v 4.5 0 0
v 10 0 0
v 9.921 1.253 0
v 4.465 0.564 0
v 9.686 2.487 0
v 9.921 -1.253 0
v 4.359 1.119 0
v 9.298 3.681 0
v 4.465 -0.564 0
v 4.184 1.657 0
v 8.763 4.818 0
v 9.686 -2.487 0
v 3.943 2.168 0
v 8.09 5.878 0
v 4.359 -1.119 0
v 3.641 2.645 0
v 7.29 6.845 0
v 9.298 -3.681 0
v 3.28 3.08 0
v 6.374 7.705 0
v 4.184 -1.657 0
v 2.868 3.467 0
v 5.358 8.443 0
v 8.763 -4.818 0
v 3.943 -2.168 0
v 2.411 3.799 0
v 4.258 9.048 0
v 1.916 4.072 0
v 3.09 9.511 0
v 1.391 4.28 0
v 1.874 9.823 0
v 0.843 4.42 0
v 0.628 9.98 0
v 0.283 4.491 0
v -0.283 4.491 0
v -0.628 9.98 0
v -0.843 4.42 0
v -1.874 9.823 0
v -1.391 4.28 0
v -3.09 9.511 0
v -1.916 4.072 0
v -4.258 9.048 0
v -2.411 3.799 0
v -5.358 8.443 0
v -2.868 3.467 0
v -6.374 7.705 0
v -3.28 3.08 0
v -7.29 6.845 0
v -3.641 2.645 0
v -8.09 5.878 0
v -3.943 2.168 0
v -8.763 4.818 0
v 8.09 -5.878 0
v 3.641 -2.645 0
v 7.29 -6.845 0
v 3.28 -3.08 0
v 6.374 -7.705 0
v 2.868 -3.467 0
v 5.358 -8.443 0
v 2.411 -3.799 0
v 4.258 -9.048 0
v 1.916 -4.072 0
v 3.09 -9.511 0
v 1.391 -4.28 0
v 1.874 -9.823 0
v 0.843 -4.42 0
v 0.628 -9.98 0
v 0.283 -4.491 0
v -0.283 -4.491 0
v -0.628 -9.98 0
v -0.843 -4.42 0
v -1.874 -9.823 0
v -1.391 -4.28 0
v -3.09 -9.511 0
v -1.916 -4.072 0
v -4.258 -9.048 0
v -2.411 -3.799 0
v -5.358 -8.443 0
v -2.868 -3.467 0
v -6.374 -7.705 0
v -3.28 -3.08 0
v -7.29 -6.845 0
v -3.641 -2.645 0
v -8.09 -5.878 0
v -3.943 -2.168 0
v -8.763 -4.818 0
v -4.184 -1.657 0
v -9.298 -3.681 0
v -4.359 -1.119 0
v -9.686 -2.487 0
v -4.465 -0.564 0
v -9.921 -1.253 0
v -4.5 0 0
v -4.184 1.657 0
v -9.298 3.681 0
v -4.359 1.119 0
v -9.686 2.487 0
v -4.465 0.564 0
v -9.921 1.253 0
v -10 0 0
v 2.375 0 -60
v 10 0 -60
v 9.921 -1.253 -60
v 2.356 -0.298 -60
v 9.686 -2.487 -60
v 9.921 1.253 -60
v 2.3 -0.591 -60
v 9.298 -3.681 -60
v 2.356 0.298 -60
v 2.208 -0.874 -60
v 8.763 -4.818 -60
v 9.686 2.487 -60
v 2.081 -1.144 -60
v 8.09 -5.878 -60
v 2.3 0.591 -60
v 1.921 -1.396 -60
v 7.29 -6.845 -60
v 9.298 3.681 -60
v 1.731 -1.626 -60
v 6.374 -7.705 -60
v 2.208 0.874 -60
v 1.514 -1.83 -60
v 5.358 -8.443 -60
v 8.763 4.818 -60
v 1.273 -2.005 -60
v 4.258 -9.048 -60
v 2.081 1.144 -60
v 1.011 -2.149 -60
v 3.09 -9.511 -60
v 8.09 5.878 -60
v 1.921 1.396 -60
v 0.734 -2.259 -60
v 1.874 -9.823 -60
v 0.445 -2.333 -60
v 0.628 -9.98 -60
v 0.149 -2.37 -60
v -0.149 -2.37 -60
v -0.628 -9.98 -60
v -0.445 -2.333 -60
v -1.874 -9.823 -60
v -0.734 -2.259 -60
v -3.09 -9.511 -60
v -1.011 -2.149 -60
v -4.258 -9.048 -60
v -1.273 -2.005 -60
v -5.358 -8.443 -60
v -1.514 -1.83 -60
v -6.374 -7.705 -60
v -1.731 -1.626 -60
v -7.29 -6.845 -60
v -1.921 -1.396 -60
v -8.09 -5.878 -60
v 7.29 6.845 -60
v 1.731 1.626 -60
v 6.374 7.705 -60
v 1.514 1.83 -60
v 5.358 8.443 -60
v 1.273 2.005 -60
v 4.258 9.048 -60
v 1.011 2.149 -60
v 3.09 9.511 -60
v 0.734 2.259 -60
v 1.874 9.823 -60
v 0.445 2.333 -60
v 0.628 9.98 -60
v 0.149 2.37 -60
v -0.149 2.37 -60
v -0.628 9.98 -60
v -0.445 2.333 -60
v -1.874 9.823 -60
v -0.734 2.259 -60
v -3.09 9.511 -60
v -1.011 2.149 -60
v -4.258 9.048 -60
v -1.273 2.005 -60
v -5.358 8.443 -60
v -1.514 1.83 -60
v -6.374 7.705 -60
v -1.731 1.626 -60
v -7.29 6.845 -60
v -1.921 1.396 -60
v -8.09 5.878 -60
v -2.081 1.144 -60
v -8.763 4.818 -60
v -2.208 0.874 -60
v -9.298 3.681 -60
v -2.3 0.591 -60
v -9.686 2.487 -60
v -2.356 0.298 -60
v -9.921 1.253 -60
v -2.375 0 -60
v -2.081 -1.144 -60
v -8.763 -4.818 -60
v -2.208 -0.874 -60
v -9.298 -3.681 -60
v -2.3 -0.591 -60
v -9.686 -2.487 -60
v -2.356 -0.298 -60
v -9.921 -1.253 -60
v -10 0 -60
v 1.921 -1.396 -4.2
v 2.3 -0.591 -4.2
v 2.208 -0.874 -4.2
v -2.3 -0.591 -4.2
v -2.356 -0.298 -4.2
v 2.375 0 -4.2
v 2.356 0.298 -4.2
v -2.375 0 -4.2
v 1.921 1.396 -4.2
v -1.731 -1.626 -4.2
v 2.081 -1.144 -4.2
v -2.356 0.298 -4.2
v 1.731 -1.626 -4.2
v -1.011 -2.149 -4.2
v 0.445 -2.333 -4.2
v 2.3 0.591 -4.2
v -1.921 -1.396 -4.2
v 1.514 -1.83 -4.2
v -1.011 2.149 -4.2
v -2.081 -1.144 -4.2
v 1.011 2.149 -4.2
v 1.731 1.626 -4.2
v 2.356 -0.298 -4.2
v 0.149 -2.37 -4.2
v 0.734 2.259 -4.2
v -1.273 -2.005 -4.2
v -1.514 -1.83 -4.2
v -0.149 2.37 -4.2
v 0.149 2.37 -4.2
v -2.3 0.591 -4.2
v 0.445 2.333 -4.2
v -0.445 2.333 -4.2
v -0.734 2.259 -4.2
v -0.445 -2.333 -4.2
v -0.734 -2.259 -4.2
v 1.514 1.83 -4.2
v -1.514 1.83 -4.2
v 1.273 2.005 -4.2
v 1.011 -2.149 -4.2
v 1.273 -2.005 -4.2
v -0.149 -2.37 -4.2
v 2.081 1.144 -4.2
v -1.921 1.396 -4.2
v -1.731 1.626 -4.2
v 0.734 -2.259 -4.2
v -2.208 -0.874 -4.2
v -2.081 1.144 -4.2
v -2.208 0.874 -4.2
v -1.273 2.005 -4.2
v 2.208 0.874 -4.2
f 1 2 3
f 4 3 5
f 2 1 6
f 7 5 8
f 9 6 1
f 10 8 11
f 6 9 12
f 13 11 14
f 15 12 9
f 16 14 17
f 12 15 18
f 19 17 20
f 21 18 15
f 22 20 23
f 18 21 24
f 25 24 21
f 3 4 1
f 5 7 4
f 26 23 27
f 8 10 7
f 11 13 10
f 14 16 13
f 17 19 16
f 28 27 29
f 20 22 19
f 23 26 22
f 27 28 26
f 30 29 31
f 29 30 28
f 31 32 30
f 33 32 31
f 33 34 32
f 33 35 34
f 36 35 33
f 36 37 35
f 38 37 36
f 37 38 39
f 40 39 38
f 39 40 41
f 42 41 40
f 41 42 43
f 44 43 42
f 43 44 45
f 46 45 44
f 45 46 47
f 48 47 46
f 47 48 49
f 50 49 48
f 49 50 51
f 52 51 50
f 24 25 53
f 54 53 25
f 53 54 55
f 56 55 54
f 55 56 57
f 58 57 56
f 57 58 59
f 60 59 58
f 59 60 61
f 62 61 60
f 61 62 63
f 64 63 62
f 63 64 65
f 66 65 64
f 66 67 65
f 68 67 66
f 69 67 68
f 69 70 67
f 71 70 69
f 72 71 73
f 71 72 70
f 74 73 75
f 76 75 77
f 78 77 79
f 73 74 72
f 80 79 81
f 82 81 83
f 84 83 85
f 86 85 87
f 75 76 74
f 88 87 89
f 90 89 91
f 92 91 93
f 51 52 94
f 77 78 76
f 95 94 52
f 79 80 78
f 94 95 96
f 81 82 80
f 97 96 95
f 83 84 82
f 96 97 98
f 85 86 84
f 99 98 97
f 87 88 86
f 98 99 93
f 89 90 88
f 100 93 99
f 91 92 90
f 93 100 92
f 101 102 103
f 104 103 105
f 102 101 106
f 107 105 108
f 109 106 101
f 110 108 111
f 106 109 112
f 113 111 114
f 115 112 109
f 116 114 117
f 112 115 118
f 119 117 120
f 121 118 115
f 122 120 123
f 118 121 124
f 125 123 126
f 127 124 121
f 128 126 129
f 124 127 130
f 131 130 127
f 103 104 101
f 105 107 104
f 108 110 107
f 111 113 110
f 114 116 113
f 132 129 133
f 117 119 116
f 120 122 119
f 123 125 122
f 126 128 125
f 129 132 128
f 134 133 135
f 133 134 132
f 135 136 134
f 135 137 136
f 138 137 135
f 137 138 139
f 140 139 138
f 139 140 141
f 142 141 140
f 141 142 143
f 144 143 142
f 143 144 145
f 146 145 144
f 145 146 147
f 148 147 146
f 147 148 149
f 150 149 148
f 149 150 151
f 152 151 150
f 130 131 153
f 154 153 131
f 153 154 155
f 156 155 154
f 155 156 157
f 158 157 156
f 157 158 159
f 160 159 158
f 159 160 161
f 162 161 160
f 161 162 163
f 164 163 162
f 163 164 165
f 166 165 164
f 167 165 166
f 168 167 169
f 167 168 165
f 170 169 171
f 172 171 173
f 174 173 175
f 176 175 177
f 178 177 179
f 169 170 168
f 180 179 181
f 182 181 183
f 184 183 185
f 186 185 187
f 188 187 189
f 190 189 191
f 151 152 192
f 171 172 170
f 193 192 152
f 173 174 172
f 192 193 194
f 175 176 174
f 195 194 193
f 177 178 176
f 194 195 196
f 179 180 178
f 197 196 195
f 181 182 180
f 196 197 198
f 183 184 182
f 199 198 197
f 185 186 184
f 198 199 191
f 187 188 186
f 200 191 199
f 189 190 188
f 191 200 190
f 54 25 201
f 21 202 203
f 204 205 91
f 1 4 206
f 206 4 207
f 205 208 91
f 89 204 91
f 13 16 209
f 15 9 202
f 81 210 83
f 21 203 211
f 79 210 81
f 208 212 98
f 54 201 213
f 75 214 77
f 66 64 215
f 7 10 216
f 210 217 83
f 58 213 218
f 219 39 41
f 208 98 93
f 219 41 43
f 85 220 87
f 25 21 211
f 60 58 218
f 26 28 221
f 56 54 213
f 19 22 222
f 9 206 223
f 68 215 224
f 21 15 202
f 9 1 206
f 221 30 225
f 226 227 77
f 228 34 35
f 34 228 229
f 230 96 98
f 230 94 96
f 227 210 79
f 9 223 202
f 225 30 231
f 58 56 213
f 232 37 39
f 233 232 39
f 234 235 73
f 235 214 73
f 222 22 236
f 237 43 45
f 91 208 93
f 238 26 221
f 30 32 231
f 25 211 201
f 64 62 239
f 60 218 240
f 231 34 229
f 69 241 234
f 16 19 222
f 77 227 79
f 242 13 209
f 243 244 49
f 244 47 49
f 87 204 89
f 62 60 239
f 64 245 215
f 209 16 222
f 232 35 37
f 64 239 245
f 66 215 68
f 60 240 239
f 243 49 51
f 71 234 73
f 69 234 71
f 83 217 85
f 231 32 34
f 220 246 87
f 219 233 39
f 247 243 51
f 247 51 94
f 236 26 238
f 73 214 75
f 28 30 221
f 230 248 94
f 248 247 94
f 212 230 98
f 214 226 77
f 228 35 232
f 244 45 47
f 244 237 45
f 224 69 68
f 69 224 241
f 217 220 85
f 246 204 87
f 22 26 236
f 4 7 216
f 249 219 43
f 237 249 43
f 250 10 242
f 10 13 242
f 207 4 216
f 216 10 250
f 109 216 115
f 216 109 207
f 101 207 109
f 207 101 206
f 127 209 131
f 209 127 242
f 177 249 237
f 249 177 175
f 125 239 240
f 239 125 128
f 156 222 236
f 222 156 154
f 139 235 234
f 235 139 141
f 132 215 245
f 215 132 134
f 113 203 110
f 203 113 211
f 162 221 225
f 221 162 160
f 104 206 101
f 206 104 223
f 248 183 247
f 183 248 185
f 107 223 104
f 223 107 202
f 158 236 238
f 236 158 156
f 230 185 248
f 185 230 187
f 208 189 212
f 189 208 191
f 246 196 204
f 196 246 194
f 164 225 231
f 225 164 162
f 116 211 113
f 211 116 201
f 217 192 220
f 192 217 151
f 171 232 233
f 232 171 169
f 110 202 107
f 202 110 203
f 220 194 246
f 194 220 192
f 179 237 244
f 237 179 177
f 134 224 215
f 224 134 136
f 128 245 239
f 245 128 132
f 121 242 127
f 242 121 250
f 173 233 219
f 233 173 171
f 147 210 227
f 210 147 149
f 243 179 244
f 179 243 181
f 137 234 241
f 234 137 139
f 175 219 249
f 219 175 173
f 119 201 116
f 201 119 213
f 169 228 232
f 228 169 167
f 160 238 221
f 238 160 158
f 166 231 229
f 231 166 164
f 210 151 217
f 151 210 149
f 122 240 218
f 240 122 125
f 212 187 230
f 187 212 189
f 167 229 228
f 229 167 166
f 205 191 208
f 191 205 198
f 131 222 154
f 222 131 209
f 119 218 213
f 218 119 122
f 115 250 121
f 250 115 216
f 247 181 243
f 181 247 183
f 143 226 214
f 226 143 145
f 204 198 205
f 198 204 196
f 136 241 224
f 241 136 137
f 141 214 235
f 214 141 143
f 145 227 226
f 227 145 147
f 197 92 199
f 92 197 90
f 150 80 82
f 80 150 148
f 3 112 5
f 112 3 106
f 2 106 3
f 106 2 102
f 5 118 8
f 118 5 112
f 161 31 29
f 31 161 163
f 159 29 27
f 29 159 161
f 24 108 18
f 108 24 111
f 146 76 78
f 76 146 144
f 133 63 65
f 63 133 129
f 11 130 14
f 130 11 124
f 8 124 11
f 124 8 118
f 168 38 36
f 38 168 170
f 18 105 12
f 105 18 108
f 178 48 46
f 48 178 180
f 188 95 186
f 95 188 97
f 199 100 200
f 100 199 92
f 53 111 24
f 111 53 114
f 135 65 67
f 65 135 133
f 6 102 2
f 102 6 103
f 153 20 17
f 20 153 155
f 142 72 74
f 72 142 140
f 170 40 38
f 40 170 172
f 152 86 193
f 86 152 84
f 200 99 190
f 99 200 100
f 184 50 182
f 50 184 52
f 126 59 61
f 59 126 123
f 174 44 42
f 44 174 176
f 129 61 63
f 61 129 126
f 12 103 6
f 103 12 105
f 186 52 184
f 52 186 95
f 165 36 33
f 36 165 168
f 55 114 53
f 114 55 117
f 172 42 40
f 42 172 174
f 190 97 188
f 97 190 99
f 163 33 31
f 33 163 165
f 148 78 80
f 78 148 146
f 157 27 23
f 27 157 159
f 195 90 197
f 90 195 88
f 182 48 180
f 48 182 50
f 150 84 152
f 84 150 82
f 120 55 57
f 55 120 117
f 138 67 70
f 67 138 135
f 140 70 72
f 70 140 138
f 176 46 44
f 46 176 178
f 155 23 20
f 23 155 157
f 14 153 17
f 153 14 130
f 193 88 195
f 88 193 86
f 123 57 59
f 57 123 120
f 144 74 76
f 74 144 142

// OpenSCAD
$fn = 50;


difference() {
	union() {
		translate(v = [0, 0, -60.0000000000]) {
			cylinder(h = 60, r = 10.0000000000);
		}
		cylinder(h = 0, r = 19.0000000000);
	}
	union() {
		translate(v = [0, 0, 0]) {
			rotate(a = [0, 0, 0]) {
				difference() {
					union() {
						#translate(v = [0, 0, -60.0000000000]) {
							cylinder(h = 60, r = 2.2500000000);
						}
						#translate(v = [0, 0, -4.2000000000]) {
							cylinder(h = 4.2000000000, r = 10.0000000000, r1 = 2.3750000000, r2 = 4.5000000000);
						}
						#translate(v = [0, 0, -60.0000000000]) {
							cylinder(h = 60, r = 2.3750000000);
						}
						#translate(v = [0, 0, -60.0000000000]) {
							cylinder(h = 60, r = 2.2500000000);
						}
					}
					union();
				}
			}
		}
	}
}
